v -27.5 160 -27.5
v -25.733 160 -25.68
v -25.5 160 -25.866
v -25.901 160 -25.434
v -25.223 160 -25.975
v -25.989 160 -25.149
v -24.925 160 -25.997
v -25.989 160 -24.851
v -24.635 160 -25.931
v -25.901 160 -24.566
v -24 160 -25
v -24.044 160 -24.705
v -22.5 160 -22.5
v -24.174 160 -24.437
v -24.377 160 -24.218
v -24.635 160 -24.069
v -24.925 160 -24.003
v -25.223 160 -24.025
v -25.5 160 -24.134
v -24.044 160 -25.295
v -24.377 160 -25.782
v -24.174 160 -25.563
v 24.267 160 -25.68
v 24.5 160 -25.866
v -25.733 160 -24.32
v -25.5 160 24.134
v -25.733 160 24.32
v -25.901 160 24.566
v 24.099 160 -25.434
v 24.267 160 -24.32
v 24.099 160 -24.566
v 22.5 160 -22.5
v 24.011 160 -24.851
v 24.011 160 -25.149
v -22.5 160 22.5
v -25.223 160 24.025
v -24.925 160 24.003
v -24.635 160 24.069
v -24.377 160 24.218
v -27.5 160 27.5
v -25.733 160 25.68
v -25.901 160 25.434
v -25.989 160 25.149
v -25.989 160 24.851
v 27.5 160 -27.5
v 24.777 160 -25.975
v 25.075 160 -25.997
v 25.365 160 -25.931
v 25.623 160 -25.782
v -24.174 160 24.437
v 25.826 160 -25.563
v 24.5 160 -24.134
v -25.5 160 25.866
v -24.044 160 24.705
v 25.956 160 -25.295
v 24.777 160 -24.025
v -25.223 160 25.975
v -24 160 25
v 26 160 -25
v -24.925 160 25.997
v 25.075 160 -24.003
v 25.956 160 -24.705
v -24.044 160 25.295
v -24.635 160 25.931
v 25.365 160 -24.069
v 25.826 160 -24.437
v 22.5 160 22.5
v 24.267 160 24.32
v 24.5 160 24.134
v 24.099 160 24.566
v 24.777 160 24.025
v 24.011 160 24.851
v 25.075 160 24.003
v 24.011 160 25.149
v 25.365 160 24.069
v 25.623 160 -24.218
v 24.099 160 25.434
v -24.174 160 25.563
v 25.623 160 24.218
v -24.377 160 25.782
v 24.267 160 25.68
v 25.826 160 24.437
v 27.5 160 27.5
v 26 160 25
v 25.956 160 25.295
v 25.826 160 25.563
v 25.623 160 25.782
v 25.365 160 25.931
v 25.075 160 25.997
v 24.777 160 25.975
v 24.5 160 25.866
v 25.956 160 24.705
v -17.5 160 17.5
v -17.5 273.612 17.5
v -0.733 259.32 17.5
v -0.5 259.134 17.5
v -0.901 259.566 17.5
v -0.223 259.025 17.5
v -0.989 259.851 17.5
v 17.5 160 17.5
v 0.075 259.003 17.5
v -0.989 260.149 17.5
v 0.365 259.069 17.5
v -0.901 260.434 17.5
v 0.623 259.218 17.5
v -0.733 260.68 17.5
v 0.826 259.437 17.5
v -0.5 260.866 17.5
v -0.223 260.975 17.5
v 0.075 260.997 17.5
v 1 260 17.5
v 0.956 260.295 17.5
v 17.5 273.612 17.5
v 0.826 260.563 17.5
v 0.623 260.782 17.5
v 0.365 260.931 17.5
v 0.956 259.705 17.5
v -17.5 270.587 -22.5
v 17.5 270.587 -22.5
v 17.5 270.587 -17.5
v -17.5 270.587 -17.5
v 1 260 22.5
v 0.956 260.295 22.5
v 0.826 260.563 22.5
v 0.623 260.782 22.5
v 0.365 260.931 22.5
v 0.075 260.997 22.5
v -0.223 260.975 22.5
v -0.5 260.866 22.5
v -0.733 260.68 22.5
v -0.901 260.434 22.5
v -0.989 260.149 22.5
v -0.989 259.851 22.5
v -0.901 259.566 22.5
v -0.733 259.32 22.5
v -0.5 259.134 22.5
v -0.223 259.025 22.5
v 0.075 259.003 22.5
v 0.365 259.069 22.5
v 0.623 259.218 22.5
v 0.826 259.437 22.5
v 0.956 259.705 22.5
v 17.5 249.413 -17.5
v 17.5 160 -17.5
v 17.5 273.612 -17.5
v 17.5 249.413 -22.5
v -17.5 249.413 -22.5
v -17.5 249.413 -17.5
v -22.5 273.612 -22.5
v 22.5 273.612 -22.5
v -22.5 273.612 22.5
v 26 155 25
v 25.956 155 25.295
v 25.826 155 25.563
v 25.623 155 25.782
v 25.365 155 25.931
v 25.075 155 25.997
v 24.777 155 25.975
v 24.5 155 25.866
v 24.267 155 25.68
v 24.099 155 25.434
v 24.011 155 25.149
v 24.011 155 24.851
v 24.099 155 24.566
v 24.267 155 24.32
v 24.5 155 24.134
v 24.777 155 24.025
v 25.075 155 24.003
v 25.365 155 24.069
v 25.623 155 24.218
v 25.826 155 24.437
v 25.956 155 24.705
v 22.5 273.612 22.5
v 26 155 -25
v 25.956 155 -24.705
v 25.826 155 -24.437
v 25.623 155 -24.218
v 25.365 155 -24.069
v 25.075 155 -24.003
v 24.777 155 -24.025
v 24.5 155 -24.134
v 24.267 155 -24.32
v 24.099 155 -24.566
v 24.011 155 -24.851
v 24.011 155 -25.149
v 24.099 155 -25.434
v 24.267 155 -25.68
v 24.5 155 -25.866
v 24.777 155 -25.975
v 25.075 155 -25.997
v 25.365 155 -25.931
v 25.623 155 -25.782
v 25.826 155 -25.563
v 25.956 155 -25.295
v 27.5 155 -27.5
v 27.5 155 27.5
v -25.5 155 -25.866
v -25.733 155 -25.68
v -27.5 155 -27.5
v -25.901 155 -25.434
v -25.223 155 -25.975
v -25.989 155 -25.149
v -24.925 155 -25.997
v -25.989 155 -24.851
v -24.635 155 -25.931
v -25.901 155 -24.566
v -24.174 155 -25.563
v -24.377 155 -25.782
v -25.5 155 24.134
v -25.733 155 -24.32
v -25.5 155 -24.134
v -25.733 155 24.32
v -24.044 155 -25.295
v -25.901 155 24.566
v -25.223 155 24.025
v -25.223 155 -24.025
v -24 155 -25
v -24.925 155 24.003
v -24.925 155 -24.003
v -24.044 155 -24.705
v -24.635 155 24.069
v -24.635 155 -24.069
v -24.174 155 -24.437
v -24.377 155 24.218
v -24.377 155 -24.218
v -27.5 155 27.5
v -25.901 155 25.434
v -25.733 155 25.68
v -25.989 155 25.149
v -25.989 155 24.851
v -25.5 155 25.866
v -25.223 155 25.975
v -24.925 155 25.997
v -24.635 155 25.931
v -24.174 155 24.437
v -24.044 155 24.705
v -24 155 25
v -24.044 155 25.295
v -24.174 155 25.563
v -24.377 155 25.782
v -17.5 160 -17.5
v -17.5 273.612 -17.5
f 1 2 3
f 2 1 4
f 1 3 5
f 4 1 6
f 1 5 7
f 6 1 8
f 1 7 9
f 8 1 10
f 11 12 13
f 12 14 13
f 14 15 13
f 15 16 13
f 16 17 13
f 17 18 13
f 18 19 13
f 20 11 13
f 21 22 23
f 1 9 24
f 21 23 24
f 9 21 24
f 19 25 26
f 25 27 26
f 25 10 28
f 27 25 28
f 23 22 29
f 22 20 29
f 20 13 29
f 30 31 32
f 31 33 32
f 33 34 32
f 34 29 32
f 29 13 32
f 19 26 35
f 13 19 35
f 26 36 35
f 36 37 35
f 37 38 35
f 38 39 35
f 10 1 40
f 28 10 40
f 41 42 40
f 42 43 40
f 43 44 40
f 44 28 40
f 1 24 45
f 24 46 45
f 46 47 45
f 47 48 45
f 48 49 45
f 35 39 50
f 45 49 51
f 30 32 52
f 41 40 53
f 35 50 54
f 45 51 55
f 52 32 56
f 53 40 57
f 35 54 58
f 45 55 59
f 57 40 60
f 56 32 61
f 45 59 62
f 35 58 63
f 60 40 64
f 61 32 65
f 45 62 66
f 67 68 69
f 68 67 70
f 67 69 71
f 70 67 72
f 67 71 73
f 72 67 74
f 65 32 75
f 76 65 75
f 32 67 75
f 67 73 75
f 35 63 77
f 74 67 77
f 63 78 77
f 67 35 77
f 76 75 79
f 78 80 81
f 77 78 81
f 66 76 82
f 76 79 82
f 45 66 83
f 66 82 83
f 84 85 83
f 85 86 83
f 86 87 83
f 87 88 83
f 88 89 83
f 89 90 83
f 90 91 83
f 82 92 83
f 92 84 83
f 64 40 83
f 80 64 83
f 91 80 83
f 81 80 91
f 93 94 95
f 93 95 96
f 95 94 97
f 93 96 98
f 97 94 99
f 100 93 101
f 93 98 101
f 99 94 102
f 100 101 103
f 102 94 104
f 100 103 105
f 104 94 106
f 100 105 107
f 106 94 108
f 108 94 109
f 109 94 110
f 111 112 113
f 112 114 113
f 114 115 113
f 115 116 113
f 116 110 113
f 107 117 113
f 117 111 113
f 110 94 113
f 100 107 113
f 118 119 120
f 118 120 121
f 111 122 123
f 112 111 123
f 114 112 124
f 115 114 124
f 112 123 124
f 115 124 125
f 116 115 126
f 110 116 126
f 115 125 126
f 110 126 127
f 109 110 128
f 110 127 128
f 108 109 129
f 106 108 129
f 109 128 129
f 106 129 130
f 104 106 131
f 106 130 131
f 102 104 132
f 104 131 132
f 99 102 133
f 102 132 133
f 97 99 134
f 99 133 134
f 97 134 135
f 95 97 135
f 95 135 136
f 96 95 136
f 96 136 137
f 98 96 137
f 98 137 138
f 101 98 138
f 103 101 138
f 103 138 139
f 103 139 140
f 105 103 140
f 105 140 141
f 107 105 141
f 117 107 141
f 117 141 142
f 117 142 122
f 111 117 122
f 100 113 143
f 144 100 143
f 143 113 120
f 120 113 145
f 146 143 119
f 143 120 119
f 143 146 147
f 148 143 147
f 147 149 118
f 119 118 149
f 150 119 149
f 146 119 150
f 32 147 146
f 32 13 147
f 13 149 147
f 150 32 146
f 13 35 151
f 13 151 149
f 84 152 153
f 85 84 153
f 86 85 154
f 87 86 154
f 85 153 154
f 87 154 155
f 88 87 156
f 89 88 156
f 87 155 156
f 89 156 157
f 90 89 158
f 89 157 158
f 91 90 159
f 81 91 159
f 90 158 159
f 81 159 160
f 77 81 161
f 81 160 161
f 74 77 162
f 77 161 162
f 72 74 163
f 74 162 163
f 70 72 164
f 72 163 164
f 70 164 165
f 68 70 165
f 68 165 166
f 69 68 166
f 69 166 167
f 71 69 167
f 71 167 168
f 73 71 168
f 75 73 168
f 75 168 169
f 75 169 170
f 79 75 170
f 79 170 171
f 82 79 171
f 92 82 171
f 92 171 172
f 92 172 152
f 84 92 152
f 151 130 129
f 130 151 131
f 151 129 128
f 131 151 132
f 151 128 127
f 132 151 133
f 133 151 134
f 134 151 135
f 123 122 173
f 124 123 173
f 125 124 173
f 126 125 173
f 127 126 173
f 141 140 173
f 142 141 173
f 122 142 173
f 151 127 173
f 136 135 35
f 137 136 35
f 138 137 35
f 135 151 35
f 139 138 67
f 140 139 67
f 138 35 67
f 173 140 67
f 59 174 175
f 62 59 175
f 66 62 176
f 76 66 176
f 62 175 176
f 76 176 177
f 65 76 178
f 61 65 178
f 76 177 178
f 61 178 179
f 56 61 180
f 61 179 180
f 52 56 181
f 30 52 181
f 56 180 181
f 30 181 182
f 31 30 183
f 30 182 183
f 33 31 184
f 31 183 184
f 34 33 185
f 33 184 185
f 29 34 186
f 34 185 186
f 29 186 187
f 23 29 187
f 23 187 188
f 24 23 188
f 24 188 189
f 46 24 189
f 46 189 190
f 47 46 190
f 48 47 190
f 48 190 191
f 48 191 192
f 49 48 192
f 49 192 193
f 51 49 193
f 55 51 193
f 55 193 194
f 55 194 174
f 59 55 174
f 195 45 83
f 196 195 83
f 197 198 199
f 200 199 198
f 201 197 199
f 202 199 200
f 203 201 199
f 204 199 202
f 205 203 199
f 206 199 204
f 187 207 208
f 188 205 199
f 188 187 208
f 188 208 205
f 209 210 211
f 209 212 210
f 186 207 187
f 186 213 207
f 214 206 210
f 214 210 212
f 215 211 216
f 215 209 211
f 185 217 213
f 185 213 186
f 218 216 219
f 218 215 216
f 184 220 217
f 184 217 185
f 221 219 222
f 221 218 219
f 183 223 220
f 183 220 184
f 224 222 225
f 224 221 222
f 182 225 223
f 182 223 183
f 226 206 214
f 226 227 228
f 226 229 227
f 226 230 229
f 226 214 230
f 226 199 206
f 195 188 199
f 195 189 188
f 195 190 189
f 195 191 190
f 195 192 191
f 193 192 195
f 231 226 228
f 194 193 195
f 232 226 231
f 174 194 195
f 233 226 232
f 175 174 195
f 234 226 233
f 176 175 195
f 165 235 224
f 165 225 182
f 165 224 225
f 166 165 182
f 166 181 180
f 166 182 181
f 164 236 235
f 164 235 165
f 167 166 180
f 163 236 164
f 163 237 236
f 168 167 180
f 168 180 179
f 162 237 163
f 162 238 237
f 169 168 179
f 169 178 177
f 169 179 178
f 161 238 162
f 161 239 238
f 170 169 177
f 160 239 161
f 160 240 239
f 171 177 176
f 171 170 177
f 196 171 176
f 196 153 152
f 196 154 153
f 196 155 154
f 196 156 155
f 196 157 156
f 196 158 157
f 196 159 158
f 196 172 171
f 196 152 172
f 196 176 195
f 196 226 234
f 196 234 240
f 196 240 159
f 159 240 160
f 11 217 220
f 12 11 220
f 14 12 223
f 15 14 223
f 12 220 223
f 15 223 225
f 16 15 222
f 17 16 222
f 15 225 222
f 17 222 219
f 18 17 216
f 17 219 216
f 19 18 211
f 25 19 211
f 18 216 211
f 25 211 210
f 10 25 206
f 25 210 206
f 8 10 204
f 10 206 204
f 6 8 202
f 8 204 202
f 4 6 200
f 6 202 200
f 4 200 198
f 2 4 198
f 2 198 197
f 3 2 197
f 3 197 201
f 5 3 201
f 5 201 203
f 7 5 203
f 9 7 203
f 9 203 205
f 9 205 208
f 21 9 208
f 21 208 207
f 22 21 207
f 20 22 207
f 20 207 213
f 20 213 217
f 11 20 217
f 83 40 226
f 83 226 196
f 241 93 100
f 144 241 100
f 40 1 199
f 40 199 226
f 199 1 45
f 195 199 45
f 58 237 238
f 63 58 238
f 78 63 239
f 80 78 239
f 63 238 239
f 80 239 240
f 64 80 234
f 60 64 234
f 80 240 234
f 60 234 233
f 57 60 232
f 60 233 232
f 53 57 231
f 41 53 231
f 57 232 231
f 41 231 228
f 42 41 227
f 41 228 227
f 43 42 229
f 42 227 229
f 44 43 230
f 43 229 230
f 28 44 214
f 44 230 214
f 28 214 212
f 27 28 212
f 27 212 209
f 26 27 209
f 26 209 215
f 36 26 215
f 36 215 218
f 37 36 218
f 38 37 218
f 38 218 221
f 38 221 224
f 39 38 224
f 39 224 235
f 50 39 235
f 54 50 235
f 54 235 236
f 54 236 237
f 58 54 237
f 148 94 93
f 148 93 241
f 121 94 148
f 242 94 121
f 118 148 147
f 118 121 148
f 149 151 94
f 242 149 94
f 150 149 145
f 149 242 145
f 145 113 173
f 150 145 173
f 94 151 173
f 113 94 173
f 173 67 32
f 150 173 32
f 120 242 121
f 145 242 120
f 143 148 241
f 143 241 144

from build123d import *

# Parameters (mm, degrees)
CROQUIS1_W                 = 45
CROQUIS1_H                 = 45
SALIENTE_EXTRUIR1_DEPTH    = 300
CROQUIS4_W                 = 18
CROQUIS4_H                 = 34
CORTAR_EXTRUIR2_DEPTH      = 46
CROQUIS8_W                 = 35
CROQUIS8_H                 = 35
CORTAR_EXTRUIR3_DEPTH      = 301
CROQUIS9_W                 = 35
CROQUIS9_H                 = 21.174410022
CORTAR_EXTRUIR4_DEPTH      = 10
CROQUIS10_R                = 1
CORTAR_EXTRUIR5_DEPTH      = 10
CROQUIS11_W                = 45
CROQUIS11_H                = 26.387879272
CORTAR_EXTRUIR6_DEPTH      = 46
CROQUIS13_W                = 45
CROQUIS13_H                = 160
CORTAR_EXTRUIR7_DEPTH      = 23.5
CORTAR_EXTRUIR7_DEPTH_BACK = 23.5
CROQUIS14_W                = 55
CROQUIS14_H                = 55
SALIENTE_EXTRUIR2_DEPTH    = 5
CROQUIS16_R                = 1
CORTAR_EXTRUIR8_DEPTH      = 1
CORTAR_EXTRUIR8_DEPTH_BACK = 119.612120728


with BuildPart() as part:
    # Croquis1 → Saliente-Extruir1 (new body)
    with BuildSketch(Plane(origin=(0, 0, 0), x_dir=(1, 0, 0), z_dir=(0, 1, 0))):
        Rectangle(CROQUIS1_W, CROQUIS1_H)
    extrude(amount=SALIENTE_EXTRUIR1_DEPTH)

    # Croquis4 → Cortar-Extruir2 (cut, through all)
    with BuildSketch(Plane.ZY.offset(22.5)):
        with Locations((13.5, 17)):
            Rectangle(CROQUIS4_W, CROQUIS4_H)
    extrude(amount=-CORTAR_EXTRUIR2_DEPTH, mode=Mode.SUBTRACT)

    # Croquis8 → Cortar-Extruir3 (cut, through all)
    with BuildSketch(Plane(origin=(0, 300, 0), x_dir=(1, 0, 0), z_dir=(0, 1, 0))):
        Rectangle(CROQUIS8_W, CROQUIS8_H)
    extrude(amount=-CORTAR_EXTRUIR3_DEPTH, mode=Mode.SUBTRACT)

    # Croquis9 → Cortar-Extruir4 (cut)
    with BuildSketch(Plane(origin=(0, 0, -22.5), x_dir=(-1, 0, 0), z_dir=(0, 0, -1))):
        with Locations((0, 260)):
            Rectangle(CROQUIS9_W, CROQUIS9_H)
    extrude(amount=-CORTAR_EXTRUIR4_DEPTH, mode=Mode.SUBTRACT)

    # Croquis10 → Cortar-Extruir5 (cut)
    with BuildSketch(Plane.XY.offset(22.5)):
        with Locations((0, 260)):
            Circle(CROQUIS10_R)
    extrude(amount=-CORTAR_EXTRUIR5_DEPTH, mode=Mode.SUBTRACT)

    # Croquis11 → Cortar-Extruir6 (cut, through all)
    with BuildSketch(Plane.XY.offset(22.5)):
        with Locations((0, 286.806060364)):
            Rectangle(CROQUIS11_W, CROQUIS11_H)
    extrude(amount=-CORTAR_EXTRUIR6_DEPTH, mode=Mode.SUBTRACT)

    # Croquis13 → Cortar-Extruir7 (cut, two sides)
    with BuildSketch(Plane(origin=(0, 0, 0), x_dir=(0, 0, -1), z_dir=(1, 0, 0))) as cortar_extruir7_sk:
        with Locations((0, 80)):
            Rectangle(CROQUIS13_W, CROQUIS13_H)
    extrude(amount=CORTAR_EXTRUIR7_DEPTH, mode=Mode.SUBTRACT)
    extrude(cortar_extruir7_sk.sketch, amount=-CORTAR_EXTRUIR7_DEPTH_BACK, mode=Mode.SUBTRACT)

    # Croquis14 → Saliente-Extruir2 (add)
    with BuildSketch(Plane.XZ.offset(-160)):
        Rectangle(CROQUIS14_W, CROQUIS14_H)
    extrude(amount=SALIENTE_EXTRUIR2_DEPTH)

    # Croquis16 → Cortar-Extruir8 (cut, two sides)
    with BuildSketch(Plane.XZ.offset(-155)) as cortar_extruir8_sk:
        with Locations((25, 25)):
            Circle(CROQUIS16_R)
        with Locations((-25, 25)):
            Circle(CROQUIS16_R)
        with Locations((-25, -25)):
            Circle(CROQUIS16_R)
        with Locations((25, -25)):
            Circle(CROQUIS16_R)
    extrude(amount=CORTAR_EXTRUIR8_DEPTH, mode=Mode.SUBTRACT)
    extrude(cortar_extruir8_sk.sketch, amount=-CORTAR_EXTRUIR8_DEPTH_BACK, mode=Mode.SUBTRACT)


solid = part.part
